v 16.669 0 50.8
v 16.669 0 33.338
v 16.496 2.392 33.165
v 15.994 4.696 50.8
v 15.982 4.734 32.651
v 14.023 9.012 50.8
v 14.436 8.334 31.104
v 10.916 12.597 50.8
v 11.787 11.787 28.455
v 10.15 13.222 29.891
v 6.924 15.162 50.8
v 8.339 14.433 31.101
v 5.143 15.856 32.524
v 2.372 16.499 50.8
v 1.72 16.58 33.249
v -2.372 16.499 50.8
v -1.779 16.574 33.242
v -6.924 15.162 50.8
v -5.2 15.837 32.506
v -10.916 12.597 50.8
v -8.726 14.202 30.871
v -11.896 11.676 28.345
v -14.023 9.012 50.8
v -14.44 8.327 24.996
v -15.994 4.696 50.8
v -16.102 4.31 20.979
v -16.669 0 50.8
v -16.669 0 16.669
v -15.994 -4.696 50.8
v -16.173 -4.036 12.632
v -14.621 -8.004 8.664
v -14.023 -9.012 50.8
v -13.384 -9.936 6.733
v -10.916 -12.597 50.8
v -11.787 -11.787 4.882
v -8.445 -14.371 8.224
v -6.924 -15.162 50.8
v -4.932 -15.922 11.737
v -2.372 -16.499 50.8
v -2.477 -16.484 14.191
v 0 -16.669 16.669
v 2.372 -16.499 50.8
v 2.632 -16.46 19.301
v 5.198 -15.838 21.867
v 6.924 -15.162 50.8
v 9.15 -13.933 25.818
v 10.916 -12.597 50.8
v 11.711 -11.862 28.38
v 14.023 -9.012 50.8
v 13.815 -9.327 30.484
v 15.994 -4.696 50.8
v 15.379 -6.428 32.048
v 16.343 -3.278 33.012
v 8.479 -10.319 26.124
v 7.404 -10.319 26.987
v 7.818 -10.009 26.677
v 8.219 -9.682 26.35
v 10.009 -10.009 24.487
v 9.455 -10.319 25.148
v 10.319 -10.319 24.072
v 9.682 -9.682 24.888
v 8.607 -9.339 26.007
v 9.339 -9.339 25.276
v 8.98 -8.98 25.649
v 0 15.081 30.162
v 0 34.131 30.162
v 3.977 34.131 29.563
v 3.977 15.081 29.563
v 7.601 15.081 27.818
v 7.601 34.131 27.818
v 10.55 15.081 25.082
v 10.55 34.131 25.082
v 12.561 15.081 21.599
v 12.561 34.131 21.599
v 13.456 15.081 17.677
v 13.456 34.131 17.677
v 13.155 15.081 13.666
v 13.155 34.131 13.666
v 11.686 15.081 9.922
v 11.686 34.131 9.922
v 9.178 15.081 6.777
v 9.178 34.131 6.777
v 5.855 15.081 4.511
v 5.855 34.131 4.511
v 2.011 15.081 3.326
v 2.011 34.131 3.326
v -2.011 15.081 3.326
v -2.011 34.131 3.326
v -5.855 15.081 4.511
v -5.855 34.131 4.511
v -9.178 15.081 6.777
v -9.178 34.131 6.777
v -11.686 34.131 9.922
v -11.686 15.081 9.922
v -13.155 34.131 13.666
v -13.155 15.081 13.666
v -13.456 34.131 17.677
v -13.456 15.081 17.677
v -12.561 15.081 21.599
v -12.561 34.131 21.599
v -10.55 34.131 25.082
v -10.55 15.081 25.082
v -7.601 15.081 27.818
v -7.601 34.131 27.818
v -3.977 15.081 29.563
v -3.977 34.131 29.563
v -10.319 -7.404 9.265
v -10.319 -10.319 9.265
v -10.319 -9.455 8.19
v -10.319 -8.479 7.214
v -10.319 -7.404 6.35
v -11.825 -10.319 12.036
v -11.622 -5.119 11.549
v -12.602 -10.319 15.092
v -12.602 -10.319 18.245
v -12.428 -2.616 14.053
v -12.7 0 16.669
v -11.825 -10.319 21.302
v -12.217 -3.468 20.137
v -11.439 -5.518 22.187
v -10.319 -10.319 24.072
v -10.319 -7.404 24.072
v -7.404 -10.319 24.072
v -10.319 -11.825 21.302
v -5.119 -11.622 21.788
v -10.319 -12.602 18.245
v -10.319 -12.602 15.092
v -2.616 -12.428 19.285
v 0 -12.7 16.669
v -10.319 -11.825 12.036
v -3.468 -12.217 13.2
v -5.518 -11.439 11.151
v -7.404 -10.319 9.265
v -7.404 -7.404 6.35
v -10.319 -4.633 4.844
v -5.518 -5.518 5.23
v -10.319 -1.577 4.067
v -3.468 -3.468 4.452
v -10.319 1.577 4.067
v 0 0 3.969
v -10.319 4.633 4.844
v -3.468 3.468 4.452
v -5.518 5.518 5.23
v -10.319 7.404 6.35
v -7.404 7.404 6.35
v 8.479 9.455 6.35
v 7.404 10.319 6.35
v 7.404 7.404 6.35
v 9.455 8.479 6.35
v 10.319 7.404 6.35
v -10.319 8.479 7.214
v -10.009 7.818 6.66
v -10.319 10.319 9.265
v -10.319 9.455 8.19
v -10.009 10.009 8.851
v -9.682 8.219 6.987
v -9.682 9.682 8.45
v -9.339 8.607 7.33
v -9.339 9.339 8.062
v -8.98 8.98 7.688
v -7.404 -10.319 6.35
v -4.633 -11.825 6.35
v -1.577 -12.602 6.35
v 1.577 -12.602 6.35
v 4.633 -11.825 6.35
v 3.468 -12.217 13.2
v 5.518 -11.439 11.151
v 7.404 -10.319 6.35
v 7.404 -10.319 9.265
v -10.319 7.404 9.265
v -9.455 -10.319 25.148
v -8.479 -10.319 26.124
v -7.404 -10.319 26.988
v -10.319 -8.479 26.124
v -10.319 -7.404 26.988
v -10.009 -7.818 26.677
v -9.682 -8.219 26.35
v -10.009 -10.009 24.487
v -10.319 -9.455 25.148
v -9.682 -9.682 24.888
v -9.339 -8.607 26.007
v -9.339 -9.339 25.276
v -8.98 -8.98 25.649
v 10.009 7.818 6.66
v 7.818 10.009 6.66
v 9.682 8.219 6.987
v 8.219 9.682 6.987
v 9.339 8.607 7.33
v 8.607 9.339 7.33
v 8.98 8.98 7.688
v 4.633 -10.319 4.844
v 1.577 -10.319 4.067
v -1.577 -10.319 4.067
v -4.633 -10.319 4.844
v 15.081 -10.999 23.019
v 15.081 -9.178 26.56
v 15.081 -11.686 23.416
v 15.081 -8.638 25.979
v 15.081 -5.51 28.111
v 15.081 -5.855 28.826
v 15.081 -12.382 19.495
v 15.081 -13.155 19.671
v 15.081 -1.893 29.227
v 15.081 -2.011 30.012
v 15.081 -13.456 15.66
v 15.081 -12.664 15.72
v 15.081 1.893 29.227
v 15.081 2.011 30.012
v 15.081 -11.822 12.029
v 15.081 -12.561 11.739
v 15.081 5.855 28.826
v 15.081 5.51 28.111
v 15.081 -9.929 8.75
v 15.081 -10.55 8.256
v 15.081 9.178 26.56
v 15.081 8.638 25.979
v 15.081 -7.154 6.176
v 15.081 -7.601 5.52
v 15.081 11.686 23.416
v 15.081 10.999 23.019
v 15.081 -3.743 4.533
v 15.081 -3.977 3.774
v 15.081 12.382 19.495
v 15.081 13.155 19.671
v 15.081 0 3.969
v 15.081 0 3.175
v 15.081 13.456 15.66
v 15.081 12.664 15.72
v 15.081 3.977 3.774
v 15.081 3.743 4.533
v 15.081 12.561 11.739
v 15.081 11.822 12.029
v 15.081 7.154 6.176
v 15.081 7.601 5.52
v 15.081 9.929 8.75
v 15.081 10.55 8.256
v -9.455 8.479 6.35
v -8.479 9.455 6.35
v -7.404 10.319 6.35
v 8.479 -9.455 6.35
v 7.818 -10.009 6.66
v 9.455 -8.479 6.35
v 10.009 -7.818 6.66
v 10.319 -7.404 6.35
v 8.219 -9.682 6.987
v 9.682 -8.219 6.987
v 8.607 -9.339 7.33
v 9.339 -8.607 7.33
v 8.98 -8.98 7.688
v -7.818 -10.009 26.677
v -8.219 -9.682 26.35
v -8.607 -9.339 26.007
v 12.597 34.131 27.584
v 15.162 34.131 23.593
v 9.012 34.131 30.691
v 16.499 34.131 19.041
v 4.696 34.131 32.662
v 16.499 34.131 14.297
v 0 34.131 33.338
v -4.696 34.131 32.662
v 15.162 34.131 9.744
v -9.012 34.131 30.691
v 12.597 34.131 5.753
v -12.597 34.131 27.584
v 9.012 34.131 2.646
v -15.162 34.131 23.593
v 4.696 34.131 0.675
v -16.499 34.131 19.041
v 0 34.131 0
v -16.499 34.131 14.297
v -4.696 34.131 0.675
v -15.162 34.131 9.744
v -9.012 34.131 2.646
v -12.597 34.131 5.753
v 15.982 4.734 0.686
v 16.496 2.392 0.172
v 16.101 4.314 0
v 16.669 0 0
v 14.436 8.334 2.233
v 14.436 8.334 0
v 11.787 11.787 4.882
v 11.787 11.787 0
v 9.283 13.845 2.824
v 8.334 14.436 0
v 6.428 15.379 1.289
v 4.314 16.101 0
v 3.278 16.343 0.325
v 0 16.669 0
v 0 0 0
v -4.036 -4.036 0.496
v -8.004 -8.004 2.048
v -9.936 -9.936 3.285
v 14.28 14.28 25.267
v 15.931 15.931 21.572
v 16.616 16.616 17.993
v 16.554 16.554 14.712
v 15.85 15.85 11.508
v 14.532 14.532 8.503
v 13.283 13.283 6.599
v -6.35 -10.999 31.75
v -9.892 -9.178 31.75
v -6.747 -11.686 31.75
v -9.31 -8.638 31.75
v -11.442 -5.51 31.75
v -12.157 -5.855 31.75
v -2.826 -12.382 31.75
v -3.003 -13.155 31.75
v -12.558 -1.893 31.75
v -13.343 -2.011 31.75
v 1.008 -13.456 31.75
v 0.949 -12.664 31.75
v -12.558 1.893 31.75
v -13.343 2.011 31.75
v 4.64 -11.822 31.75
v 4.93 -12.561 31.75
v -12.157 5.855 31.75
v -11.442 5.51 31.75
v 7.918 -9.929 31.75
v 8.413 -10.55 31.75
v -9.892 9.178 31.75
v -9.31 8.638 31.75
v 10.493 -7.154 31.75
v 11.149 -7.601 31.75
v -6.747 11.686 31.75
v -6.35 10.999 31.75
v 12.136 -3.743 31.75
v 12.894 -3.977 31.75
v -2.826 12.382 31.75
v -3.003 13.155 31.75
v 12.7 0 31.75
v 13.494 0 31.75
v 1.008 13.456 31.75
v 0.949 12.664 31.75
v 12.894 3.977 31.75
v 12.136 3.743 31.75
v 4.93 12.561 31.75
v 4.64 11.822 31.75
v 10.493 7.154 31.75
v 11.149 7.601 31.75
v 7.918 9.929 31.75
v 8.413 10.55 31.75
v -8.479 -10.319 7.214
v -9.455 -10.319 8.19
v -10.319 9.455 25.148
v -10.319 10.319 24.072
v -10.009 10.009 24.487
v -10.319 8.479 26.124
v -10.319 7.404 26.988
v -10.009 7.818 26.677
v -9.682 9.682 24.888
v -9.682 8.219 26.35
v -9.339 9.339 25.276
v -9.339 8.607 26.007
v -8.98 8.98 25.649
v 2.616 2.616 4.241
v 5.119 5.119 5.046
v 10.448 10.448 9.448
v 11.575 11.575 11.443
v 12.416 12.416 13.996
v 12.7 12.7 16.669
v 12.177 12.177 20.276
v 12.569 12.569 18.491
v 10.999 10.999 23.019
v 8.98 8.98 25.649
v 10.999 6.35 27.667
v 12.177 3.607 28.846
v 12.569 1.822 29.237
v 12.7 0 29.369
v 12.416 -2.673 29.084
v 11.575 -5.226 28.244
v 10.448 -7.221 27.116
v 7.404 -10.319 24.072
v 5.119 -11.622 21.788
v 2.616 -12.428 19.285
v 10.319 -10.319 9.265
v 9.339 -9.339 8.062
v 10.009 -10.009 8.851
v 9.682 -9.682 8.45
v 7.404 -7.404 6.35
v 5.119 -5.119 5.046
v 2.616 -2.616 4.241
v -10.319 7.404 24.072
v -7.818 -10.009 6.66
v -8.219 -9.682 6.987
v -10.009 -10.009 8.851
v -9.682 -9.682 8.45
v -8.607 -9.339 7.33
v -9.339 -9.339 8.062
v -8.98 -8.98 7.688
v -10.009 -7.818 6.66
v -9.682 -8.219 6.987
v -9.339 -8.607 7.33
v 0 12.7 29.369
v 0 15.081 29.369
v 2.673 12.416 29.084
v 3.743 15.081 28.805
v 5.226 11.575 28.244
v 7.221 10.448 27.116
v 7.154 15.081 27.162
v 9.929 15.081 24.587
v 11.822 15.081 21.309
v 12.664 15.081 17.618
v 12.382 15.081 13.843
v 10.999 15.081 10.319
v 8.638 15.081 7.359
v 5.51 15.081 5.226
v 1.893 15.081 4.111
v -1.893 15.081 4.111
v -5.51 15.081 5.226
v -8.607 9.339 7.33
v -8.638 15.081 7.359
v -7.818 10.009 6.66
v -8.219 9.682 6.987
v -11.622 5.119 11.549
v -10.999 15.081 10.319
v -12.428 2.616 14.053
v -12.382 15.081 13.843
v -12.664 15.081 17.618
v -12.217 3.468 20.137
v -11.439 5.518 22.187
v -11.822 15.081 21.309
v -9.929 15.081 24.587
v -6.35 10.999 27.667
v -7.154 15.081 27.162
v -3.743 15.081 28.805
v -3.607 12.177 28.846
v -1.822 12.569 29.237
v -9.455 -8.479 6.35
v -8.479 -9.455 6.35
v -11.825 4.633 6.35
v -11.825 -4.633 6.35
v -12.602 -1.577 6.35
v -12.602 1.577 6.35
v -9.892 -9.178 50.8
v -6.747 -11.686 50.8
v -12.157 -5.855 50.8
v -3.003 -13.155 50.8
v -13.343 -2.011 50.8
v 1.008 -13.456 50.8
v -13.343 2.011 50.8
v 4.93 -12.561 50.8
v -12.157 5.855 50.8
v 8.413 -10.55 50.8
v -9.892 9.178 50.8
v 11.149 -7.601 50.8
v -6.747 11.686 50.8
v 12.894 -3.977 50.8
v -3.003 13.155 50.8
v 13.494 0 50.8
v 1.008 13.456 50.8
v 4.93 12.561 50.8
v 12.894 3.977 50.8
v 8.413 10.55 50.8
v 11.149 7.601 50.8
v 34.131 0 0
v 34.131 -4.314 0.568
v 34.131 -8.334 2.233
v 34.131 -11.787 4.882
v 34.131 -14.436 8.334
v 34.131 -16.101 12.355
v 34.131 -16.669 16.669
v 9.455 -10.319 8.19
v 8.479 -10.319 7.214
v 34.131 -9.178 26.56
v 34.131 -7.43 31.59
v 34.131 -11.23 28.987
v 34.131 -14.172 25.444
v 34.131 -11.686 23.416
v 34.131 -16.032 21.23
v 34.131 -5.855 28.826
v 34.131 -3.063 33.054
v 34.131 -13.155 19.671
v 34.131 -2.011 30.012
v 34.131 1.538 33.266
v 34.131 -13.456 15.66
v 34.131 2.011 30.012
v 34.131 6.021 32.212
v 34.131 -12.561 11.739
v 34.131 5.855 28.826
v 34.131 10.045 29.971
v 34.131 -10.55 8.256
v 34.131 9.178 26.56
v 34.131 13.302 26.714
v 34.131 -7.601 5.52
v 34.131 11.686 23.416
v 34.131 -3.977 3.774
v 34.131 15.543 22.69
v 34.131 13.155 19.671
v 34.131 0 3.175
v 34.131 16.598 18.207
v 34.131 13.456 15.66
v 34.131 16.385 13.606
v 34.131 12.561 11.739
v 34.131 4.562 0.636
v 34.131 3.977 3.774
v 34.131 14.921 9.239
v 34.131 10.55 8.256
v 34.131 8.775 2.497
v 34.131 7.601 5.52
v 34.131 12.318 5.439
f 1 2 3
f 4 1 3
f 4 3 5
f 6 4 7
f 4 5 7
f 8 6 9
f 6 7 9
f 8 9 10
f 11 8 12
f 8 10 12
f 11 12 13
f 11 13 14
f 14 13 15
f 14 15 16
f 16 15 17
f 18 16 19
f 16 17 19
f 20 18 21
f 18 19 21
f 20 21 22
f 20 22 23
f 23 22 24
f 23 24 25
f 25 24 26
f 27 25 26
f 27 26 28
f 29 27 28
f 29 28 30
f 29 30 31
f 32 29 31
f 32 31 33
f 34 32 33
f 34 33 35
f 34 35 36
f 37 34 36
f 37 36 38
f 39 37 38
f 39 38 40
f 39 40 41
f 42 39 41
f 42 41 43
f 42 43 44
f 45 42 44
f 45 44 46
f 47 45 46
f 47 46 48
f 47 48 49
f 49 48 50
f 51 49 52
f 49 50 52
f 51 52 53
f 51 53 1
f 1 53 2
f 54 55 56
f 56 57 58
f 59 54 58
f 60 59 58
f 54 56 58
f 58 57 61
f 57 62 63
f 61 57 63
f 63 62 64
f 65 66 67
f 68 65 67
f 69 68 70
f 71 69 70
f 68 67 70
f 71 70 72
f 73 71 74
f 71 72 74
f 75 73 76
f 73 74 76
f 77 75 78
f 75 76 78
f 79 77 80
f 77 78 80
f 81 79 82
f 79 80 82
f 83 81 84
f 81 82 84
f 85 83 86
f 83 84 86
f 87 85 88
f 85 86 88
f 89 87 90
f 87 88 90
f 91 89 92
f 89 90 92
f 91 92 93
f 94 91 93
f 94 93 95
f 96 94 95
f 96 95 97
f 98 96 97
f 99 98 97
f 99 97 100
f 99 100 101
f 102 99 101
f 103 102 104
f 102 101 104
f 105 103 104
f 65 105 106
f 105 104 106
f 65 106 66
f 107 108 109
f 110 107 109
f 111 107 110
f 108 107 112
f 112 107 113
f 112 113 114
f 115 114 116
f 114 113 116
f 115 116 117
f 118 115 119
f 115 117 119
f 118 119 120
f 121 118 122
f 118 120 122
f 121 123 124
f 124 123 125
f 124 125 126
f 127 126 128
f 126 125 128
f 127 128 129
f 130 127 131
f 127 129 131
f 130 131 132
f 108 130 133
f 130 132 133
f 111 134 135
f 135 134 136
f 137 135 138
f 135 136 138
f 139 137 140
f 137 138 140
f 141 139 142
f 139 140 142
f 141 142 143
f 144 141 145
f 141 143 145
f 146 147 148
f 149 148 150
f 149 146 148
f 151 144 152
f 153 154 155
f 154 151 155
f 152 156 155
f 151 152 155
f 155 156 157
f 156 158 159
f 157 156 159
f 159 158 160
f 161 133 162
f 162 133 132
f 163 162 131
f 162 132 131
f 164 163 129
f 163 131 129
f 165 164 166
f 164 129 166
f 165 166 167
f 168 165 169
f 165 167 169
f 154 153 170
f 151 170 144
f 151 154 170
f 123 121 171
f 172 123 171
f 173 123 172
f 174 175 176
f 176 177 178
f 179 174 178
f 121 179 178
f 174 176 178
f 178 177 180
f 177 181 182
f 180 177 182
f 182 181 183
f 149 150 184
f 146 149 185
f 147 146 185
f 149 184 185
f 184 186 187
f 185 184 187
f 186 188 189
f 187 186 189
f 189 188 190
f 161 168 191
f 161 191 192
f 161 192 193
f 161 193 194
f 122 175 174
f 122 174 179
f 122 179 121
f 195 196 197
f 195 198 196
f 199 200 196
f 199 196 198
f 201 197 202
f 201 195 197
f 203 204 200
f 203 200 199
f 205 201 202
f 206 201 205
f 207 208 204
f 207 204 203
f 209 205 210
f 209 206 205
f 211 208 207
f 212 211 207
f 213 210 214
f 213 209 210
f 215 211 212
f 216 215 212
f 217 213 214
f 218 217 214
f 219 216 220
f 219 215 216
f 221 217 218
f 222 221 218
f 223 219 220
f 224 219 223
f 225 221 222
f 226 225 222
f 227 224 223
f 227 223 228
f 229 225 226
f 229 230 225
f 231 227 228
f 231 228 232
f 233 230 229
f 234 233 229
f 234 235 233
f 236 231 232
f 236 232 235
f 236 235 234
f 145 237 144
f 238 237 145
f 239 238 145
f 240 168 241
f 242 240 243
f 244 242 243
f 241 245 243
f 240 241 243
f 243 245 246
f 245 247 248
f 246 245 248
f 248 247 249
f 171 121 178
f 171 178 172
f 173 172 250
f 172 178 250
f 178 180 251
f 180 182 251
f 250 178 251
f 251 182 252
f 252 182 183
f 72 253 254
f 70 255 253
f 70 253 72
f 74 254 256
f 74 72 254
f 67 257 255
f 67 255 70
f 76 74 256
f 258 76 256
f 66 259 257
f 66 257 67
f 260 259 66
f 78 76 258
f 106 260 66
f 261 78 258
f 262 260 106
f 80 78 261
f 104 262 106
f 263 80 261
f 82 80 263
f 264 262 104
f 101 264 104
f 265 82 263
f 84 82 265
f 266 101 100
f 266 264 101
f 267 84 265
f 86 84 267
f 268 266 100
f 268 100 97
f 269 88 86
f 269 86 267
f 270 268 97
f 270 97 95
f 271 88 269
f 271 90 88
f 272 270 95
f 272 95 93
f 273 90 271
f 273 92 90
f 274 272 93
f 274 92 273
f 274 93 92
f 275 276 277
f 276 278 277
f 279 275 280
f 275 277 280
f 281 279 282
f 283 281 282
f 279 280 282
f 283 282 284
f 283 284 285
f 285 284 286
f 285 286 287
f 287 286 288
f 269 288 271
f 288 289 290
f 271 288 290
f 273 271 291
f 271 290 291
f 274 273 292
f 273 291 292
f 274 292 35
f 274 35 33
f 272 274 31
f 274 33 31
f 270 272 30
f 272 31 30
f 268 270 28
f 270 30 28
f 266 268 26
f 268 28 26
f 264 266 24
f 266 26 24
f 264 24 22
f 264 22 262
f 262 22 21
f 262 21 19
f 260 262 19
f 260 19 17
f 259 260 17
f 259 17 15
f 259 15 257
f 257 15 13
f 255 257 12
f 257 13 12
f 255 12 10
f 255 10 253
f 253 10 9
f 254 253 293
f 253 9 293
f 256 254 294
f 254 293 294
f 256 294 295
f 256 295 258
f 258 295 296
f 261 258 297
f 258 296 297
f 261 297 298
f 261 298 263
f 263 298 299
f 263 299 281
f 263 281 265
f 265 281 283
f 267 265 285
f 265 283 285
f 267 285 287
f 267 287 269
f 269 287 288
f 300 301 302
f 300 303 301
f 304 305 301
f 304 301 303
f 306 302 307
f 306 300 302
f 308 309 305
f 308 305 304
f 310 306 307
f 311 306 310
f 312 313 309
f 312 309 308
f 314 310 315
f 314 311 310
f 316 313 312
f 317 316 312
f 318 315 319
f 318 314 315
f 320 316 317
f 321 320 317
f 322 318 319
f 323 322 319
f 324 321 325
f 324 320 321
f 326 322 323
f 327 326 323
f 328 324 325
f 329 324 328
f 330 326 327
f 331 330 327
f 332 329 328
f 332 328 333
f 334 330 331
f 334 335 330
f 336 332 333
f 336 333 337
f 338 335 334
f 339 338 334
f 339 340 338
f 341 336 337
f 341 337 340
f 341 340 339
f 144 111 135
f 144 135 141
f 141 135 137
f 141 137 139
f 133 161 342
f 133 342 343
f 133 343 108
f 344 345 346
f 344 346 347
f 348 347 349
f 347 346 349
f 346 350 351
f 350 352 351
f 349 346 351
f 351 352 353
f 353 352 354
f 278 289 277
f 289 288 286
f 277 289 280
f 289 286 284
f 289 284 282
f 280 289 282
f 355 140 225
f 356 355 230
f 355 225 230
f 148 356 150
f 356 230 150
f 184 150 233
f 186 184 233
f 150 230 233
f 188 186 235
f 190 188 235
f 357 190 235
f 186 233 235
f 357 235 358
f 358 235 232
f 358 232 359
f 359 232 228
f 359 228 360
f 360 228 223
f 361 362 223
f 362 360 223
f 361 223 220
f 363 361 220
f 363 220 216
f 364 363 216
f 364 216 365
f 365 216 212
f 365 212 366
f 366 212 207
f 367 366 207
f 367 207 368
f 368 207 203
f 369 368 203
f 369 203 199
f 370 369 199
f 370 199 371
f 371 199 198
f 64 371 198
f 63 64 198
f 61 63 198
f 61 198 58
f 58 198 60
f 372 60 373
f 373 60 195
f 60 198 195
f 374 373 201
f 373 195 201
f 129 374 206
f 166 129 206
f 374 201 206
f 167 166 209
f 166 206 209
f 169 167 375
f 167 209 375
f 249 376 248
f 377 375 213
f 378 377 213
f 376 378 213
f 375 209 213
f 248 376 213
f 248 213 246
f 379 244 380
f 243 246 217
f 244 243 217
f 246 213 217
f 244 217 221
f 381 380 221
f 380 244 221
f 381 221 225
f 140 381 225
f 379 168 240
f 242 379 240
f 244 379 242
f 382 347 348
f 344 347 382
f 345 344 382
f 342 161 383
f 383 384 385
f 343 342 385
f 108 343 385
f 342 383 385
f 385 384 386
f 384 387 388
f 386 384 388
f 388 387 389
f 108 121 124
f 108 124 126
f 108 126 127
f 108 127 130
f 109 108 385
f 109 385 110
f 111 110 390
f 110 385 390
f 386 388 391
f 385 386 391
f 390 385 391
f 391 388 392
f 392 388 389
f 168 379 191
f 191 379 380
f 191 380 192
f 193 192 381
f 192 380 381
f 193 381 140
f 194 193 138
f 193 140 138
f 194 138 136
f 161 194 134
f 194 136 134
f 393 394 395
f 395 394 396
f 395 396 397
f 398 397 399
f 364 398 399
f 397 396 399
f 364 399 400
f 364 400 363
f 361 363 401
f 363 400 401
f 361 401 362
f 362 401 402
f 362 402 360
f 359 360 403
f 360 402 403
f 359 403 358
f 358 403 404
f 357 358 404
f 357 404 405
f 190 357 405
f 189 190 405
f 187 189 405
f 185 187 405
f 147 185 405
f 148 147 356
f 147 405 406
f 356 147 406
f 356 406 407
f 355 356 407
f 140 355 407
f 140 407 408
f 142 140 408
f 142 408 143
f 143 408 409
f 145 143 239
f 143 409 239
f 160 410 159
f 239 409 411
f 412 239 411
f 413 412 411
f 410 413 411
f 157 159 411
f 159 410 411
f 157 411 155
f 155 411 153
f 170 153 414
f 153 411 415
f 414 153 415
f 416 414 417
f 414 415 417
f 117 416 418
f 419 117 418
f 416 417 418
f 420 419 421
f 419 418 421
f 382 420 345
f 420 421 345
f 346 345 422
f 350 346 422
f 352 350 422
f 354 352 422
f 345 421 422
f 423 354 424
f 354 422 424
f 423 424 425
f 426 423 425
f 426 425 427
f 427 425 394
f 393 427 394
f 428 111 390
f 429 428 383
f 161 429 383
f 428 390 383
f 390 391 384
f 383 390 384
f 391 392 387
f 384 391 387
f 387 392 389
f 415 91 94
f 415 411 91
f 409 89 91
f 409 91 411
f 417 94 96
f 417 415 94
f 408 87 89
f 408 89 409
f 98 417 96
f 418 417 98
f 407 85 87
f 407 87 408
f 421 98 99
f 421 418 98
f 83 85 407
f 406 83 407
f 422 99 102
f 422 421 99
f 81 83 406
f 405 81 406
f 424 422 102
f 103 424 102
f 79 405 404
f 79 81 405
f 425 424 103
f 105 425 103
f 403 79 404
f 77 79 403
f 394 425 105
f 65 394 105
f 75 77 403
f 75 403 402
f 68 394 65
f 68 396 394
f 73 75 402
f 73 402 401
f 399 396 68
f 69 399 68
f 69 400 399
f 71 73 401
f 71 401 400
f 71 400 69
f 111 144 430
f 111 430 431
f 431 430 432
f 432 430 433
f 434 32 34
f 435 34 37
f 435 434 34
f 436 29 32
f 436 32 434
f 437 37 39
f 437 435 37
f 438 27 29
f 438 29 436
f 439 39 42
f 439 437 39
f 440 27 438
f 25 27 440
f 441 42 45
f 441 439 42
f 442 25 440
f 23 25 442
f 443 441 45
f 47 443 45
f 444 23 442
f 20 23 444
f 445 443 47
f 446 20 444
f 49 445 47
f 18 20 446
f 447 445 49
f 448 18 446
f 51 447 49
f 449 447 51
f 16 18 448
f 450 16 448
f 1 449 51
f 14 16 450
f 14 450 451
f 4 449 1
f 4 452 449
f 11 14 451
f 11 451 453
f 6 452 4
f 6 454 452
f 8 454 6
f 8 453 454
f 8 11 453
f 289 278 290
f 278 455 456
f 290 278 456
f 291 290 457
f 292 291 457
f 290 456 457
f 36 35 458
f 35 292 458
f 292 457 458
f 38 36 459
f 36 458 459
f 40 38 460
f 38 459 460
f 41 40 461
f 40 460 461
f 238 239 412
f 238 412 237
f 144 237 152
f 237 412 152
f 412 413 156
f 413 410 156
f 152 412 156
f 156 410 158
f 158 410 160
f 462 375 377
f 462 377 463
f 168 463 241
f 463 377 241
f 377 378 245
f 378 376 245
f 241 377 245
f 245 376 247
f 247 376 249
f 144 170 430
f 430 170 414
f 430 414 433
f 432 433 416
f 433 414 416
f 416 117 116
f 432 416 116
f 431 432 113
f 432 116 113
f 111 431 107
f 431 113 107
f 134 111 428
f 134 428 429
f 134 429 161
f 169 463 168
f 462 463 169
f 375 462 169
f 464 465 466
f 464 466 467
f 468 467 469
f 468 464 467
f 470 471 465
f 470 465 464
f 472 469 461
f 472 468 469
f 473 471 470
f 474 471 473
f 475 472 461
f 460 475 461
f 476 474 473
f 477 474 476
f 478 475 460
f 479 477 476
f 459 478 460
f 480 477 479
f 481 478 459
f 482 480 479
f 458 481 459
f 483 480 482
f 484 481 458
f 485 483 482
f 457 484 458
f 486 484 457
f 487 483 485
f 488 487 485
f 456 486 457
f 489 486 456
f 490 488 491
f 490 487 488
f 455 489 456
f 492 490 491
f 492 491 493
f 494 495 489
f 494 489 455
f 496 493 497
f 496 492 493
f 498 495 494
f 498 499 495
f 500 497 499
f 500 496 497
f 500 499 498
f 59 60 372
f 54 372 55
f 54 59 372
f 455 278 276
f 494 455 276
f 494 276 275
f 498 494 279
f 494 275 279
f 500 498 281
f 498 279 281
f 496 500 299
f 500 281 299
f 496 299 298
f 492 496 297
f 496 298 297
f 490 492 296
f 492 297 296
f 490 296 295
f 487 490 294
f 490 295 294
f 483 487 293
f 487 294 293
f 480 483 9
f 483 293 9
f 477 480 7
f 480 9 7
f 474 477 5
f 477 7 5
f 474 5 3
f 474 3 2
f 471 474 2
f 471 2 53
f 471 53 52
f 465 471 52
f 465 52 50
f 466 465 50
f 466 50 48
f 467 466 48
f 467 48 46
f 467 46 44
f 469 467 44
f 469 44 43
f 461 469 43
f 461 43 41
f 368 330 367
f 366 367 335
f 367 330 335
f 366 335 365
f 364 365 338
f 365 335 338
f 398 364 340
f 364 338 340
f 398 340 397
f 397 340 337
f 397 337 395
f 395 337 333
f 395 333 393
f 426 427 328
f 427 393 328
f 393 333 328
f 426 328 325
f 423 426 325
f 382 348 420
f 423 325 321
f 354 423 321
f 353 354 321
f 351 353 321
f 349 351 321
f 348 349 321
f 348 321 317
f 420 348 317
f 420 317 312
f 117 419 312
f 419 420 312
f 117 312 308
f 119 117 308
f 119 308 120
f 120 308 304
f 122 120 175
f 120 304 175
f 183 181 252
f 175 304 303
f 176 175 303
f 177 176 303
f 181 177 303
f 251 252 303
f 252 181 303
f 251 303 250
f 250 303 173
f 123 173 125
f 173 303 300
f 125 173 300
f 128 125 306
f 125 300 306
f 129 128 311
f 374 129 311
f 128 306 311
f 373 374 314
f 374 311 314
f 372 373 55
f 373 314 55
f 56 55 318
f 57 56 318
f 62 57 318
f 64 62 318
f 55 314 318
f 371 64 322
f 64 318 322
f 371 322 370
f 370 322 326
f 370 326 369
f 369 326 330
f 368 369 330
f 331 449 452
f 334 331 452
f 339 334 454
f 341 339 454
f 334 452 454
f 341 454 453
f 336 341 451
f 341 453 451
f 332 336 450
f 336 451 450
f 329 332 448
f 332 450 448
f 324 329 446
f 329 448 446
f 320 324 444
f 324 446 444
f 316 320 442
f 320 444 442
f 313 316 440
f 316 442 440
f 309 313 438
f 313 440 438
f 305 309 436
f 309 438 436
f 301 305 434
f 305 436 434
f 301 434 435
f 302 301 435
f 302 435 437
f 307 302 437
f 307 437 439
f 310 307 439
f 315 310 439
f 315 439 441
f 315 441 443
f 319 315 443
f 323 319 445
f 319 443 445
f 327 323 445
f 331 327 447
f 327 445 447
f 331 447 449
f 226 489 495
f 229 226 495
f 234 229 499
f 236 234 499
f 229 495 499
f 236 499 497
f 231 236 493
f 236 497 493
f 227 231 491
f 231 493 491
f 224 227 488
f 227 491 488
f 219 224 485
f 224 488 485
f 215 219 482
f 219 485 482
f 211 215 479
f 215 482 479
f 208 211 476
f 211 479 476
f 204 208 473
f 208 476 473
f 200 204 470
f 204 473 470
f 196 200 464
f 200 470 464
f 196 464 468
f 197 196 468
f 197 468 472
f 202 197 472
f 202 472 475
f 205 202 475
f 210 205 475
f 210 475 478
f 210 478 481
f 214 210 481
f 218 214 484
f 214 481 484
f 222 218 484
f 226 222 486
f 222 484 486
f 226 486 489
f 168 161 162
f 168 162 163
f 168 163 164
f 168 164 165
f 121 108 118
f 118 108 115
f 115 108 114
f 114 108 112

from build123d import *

# Parameters (mm, degrees)
SKETCH1_R               = 16.66875
BOSS_EXTRUDE1_DEPTH     = 50.8
SKETCH2_R               = 16.66875
BOSS_EXTRUDE2_DEPTH     = 34.13125
SKETCH3_R               = 16.66875
BOSS_EXTRUDE3_DEPTH     = 34.13125
CUT_EXTRUDE1_DEPTH      = 71.075134343
CUT_EXTRUDE1_DEPTH_BACK = 71.075134343
CUT_EXTRUDE2_DEPTH      = 80.537552304
SKETCH8_R               = 12.7
CUT_EXTRUDE3_DEPTH      = 44.45
SKETCH9_R               = 13.49375
CUT_EXTRUDE4_DEPTH      = 19.05
SKETCH10_R              = 12.7
CUT_EXTRUDE5_DEPTH      = 44.45
SKETCH11_R              = 13.49375
CUT_EXTRUDE6_DEPTH      = 19.05
SKETCH12_R              = 12.7
CUT_EXTRUDE7_DEPTH      = 44.45
SKETCH13_R              = 13.49375
CUT_EXTRUDE8_DEPTH      = 19.05


with BuildPart() as part:
    # Sketch1 → Boss-Extrude1 (new body)
    with BuildSketch(Plane.XY):
        Circle(SKETCH1_R)
    extrude(amount=BOSS_EXTRUDE1_DEPTH)

    # Sketch2 → Boss-Extrude2 (add)
    with BuildSketch(Plane(origin=(0, 0, 0), x_dir=(0, 0, -1), z_dir=(1, 0, 0))):
        with Locations((-16.66875, 0)):
            Circle(SKETCH2_R)
    extrude(amount=BOSS_EXTRUDE2_DEPTH)

    # Sketch3 → Boss-Extrude3 (add)
    with BuildSketch(Plane(origin=(0, 0, 0), x_dir=(1, 0, 0), z_dir=(0, 1, 0))):
        with Locations(Location((0, -16.66875, 0), (0, 0, 90))):
            Circle(SKETCH3_R)
    extrude(amount=BOSS_EXTRUDE3_DEPTH)

    # Sketch4 → Cut-Extrude1 (cut, two sides: drawn at the far end of the back side and taken through both)
    with BuildSketch(Plane(origin=(0, 0, 0), x_dir=(1, 0, 0), z_dir=(0, 1, 0)).offset(-CUT_EXTRUDE1_DEPTH_BACK)):
        with BuildLine():
            Line((-16.66875, -16.66875), (-16.66875, 0))
            Line((-16.66875, 0), (0, 0))
            ThreePointArc((0, 0), (-11.786586159, -4.882163841), (-16.66875, -16.66875))
        make_face()
    extrude(amount=CUT_EXTRUDE1_DEPTH + CUT_EXTRUDE1_DEPTH_BACK, mode=Mode.SUBTRACT)

    # Sketch5 → Cut-Extrude2 (cut, through all)
    with BuildSketch(Plane(origin=(34.13125, 0, 0), x_dir=(0, 0, -1), z_dir=(1, 0, 0))):
        with BuildLine():
            Line((-16.66875, -16.66875), (0, -16.66875))
            Line((0, -16.66875), (0, 0))
            ThreePointArc((0, 0), (-4.882163841, -11.786586159), (-16.66875, -16.66875))
        make_face()
    extrude(amount=-CUT_EXTRUDE2_DEPTH, mode=Mode.SUBTRACT)

    # Sketch8 → Cut-Extrude3 (cut)
    with BuildSketch(Plane(origin=(0, 34.13125, 0), x_dir=(1, 0, 0), z_dir=(0, 1, 0))):
        with Locations(Location((0, -16.66875, 0), (0, 0, 270))):
            Circle(SKETCH8_R)
    extrude(amount=-CUT_EXTRUDE3_DEPTH, mode=Mode.SUBTRACT)

    # Sketch9 → Cut-Extrude4 (cut)
    with BuildSketch(Plane(origin=(0, 34.13125, 0), x_dir=(1, 0, 0), z_dir=(0, 1, 0))):
        with Locations(Location((0, -16.66875, 0), (0, 0, 270))):
            Circle(SKETCH9_R)
    extrude(amount=-CUT_EXTRUDE4_DEPTH, mode=Mode.SUBTRACT)

    # Sketch10 → Cut-Extrude5 (cut)
    with BuildSketch(Plane(origin=(34.13125, 0, 0), x_dir=(0, 0, -1), z_dir=(1, 0, 0))):
        with Locations((-16.66875, 0)):
            Circle(SKETCH10_R)
    extrude(amount=-CUT_EXTRUDE5_DEPTH, mode=Mode.SUBTRACT)

    # Sketch11 → Cut-Extrude6 (cut)
    with BuildSketch(Plane(origin=(34.13125, 0, 0), x_dir=(0, 0, -1), z_dir=(1, 0, 0))):
        with Locations((-16.66875, 0)):
            Circle(SKETCH11_R)
    extrude(amount=-CUT_EXTRUDE6_DEPTH, mode=Mode.SUBTRACT)

    # Sketch12 → Cut-Extrude7 (cut)
    with BuildSketch(Plane.XY.offset(50.8)):
        Circle(SKETCH12_R)
    extrude(amount=-CUT_EXTRUDE7_DEPTH, mode=Mode.SUBTRACT)

    # Sketch13 → Cut-Extrude8 (cut)
    with BuildSketch(Plane.XY.offset(50.8)):
        Circle(SKETCH13_R)
    extrude(amount=-CUT_EXTRUDE8_DEPTH, mode=Mode.SUBTRACT)


solid = part.part
